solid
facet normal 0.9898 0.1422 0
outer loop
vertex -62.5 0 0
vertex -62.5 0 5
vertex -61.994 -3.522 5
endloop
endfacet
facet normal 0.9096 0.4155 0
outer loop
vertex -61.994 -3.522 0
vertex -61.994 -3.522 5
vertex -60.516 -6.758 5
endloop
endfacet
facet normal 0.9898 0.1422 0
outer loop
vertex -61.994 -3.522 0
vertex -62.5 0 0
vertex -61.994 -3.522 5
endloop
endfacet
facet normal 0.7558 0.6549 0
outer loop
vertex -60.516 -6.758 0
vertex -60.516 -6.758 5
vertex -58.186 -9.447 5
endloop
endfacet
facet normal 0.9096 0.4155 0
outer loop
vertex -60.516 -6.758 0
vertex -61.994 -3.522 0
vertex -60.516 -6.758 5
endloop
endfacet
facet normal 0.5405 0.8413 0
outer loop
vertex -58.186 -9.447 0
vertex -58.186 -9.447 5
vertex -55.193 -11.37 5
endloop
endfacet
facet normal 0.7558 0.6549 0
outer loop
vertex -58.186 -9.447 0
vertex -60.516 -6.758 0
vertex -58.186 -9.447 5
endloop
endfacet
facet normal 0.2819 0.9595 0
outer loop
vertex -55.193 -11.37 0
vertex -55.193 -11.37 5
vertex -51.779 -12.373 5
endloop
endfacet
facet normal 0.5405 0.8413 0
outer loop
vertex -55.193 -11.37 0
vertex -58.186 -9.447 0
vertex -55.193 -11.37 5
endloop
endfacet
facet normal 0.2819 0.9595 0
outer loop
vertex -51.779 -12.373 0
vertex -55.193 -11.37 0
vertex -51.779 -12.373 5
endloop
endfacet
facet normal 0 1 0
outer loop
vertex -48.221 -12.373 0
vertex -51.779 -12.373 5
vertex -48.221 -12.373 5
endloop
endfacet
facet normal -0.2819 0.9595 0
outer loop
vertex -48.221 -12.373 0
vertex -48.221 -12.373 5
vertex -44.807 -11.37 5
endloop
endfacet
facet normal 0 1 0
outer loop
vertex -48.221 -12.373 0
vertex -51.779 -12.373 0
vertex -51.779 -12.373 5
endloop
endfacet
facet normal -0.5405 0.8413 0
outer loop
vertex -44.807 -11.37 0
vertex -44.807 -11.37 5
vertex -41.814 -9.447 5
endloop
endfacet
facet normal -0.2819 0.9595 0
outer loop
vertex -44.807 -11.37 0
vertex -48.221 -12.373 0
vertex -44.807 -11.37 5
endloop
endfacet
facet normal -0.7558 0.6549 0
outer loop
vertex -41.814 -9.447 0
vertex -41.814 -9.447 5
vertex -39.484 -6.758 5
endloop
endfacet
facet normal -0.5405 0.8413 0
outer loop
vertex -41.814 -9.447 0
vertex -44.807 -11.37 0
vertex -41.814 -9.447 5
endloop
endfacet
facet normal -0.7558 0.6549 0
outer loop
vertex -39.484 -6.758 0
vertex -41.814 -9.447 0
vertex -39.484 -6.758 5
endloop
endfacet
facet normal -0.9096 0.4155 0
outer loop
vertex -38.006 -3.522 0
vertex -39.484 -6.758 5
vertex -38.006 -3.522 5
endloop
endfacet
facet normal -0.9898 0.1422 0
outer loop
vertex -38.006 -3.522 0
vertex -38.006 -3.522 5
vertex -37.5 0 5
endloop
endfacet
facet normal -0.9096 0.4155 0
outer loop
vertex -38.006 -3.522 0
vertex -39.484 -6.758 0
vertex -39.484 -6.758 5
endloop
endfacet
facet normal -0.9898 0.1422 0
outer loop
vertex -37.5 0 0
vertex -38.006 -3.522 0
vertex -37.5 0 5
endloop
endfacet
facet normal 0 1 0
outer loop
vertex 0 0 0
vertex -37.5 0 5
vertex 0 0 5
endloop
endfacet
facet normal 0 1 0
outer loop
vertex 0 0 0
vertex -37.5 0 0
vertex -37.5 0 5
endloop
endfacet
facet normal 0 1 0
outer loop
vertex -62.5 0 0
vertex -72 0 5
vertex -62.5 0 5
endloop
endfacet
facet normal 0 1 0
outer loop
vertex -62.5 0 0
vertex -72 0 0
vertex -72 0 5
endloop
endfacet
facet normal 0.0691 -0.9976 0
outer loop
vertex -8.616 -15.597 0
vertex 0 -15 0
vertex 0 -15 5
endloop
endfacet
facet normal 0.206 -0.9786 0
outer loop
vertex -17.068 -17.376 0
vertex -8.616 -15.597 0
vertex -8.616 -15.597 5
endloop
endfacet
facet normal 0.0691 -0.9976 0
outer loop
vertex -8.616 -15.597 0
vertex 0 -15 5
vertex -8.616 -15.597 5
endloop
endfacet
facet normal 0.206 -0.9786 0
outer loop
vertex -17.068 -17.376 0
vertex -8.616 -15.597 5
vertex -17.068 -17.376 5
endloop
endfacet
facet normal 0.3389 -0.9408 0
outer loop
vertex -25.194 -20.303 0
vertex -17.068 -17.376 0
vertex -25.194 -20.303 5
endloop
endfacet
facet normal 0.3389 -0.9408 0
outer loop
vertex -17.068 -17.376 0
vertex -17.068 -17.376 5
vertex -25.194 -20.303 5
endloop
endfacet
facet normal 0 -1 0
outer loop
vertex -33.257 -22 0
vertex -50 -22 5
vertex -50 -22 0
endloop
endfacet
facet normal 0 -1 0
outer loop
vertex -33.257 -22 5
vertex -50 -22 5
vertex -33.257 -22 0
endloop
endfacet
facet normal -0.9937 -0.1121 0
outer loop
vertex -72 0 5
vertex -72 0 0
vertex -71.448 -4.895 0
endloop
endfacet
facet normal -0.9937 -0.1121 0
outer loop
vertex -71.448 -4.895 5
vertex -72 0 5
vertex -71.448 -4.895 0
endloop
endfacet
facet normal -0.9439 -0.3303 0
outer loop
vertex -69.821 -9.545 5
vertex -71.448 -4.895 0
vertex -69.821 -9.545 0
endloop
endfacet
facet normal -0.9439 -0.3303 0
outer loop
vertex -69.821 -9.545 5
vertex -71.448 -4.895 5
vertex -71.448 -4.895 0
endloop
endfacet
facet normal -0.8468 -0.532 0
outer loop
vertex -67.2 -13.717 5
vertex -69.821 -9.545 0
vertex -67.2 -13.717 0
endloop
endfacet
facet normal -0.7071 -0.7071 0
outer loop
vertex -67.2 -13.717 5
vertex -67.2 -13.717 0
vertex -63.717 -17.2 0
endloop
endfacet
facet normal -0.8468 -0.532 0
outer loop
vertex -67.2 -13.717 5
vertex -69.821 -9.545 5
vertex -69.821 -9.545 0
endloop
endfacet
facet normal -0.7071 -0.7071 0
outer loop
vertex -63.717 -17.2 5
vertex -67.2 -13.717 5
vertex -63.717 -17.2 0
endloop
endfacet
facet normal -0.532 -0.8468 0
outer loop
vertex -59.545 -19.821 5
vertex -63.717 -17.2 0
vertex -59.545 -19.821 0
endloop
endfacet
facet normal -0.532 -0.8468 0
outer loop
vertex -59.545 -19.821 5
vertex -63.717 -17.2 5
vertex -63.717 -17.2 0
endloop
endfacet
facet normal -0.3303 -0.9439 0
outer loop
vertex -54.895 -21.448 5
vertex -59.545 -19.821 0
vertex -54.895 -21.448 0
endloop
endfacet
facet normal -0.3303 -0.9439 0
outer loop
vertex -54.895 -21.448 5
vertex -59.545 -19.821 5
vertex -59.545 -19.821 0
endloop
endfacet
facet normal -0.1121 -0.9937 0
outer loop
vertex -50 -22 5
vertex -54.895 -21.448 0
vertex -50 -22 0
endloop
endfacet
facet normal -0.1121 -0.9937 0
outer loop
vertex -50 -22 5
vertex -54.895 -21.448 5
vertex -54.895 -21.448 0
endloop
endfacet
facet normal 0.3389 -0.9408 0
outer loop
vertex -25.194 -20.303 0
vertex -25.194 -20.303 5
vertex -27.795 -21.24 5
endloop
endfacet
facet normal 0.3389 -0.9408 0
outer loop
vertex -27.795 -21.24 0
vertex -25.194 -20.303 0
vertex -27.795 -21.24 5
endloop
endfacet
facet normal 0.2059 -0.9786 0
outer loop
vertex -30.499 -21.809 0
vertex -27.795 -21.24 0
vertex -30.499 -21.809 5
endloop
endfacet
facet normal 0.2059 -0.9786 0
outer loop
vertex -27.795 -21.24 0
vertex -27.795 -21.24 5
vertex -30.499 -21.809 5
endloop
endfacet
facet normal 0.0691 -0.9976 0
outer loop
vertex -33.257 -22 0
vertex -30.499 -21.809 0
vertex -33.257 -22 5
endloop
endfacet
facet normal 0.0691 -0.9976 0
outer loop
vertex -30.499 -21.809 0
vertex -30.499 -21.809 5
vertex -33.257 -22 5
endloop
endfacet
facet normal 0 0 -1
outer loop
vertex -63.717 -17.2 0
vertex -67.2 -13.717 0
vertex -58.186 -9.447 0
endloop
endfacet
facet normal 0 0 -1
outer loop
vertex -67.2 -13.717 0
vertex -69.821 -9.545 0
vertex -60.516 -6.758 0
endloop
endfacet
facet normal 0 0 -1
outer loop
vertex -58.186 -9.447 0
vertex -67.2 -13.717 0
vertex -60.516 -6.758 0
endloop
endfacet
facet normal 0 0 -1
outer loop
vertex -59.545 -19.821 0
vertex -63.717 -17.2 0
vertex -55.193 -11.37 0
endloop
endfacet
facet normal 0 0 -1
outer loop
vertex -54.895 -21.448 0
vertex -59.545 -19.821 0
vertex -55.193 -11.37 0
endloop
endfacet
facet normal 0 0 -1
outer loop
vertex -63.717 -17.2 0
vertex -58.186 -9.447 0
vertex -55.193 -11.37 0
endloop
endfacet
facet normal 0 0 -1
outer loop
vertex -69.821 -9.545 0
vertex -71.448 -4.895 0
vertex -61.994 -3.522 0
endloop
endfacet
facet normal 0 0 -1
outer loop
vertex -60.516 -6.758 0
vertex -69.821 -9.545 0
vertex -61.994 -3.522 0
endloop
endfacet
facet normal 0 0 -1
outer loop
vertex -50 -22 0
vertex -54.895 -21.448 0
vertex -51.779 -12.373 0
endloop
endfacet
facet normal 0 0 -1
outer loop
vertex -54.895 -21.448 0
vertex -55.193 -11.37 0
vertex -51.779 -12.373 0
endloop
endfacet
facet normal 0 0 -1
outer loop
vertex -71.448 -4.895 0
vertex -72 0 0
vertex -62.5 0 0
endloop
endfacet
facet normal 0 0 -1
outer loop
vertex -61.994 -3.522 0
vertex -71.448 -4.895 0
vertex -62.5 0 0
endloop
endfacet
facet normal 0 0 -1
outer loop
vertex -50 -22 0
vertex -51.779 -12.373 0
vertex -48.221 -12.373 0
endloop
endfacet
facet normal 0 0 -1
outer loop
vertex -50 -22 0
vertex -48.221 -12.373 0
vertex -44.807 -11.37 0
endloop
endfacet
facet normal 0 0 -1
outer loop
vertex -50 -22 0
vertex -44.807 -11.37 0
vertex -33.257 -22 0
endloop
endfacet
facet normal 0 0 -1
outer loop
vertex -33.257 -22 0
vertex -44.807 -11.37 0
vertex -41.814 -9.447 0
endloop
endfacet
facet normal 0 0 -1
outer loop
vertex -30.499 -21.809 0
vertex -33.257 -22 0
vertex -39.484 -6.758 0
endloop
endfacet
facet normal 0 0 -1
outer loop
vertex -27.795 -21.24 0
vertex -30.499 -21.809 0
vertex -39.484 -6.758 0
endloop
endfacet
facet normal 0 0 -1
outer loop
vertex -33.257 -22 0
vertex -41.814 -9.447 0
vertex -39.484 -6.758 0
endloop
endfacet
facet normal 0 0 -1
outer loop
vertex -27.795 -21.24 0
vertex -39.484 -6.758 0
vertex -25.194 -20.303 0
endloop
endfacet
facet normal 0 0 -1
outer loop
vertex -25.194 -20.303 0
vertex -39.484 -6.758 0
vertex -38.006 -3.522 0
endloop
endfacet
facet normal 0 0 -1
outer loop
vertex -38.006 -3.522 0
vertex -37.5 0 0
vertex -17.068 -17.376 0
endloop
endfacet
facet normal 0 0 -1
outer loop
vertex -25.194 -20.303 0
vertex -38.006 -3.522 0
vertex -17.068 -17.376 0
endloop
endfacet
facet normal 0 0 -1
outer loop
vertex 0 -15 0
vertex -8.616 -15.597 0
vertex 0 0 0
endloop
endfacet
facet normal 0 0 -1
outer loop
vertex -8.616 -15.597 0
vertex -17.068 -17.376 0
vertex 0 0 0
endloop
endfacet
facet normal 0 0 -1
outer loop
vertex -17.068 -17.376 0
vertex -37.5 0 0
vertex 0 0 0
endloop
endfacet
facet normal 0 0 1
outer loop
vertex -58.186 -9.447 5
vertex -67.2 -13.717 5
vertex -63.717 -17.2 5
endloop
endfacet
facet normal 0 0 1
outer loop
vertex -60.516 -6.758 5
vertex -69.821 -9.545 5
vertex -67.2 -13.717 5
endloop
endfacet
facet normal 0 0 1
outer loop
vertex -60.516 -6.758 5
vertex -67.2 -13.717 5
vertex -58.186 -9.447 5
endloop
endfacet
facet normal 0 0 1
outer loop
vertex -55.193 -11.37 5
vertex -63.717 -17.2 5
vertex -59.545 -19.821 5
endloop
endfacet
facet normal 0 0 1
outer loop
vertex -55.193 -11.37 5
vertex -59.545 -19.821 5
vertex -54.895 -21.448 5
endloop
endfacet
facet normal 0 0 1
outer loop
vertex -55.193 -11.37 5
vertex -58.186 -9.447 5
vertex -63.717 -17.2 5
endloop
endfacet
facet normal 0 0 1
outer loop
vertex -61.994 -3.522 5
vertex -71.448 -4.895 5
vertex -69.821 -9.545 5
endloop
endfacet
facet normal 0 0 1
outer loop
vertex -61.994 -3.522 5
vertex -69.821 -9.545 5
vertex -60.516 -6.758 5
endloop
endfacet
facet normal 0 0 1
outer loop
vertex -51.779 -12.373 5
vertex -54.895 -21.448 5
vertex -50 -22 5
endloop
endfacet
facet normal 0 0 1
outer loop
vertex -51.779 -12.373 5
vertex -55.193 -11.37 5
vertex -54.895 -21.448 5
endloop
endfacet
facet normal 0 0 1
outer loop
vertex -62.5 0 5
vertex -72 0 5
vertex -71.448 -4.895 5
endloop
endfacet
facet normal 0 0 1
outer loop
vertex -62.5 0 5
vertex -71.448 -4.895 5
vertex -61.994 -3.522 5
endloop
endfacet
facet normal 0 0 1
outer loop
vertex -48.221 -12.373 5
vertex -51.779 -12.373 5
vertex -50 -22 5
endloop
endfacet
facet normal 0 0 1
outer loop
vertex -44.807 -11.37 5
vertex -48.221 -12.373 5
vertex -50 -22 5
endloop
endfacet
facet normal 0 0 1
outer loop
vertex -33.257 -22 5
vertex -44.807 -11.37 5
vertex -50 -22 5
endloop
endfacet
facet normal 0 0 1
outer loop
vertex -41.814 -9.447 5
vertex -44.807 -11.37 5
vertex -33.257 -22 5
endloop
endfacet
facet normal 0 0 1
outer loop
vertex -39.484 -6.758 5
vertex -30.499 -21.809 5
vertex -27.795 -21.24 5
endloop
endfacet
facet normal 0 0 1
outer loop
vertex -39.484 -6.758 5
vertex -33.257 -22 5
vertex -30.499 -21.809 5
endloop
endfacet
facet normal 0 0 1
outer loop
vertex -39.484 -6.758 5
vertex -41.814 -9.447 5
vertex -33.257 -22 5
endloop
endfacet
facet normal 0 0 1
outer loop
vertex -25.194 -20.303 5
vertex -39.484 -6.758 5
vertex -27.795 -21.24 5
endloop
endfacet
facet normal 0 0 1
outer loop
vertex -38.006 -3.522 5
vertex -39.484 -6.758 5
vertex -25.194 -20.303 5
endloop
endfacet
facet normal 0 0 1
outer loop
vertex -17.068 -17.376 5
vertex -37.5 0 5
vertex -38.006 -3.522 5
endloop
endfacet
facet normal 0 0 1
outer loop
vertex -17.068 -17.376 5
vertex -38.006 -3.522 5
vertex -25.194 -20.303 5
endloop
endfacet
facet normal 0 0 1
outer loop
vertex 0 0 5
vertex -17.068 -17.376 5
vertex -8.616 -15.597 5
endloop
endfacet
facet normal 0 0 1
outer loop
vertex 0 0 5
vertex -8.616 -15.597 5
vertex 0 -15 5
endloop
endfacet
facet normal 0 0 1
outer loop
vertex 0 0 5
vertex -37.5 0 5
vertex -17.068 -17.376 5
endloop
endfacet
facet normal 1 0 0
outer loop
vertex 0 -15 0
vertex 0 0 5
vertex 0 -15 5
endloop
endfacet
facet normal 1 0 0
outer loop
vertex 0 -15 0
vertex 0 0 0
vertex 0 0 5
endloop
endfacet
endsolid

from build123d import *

# Parameters (mm, degrees)
SKETCH_R             = 12.5
PAD_DEPTH            = 5
SKETCH001_R          = 62.5
POCKET_DEPTH         = 5.001
POCKET_DEPTH_BACK    = -5.001
FILLET_R             = 20
POCKET001_DEPTH      = 5.001
POCKET001_DEPTH_BACK = -5.001
SKETCH003_W          = 72
SKETCH003_H          = 22
POCKET002_DEPTH      = 5.001


with BuildPart() as part:
    # Sketch → Pad (new body, symmetric)
    with BuildSketch(Plane.XY):
        with BuildLine():
            ThreePointArc((-50, 22), (-72, 0), (-50, -22))
            Line((-50, -22), (50, -22))
            ThreePointArc((50, -22), (72, 0), (50, 22))
            Line((50, 22), (-50, 22))
        make_face()
        with Locations((-50, 0)):
            Circle(SKETCH_R, mode=Mode.SUBTRACT)
        with Locations((50, 0)):
            Circle(SKETCH_R, mode=Mode.SUBTRACT)
    extrude(amount=PAD_DEPTH, both=True)

    # Sketch001 → Pocket (cut, two sides)
    with BuildSketch(Plane.XY) as pocket_sk:
        with Locations((0, -77.5)):
            Circle(SKETCH001_R)
        with Locations((0, 77.5)):
            Circle(SKETCH001_R)
    extrude(amount=-POCKET_DEPTH, mode=Mode.SUBTRACT)
    extrude(pocket_sk.sketch, amount=-POCKET_DEPTH_BACK, mode=Mode.SUBTRACT)

    # Fillet
    fillet_edges = [part.edges().sort_by_distance(p)[0] for p in [
        (-28.740216, -22, 0),
        (28.740216, -22, 0),
        (-28.740216, 22, 0),
        (28.740216, 22, 0),
    ]]
    fillet(fillet_edges, radius=FILLET_R)

    # Sketch002 → Pocket001 (cut, two sides)
    with BuildSketch(Plane.XY) as pocket001_sk:
        Polygon((72, -22), (72, 22), (-72, 22), (-72, 0), (0, 0), (0, -22), align=None)
    extrude(amount=-POCKET001_DEPTH, mode=Mode.SUBTRACT)
    extrude(pocket001_sk.sketch, amount=-POCKET001_DEPTH_BACK, mode=Mode.SUBTRACT)

    # Sketch003 → Pocket002 (cut, through all)
    with BuildSketch(Plane.XY):
        with Locations((-36, -11)):
            Rectangle(SKETCH003_W, SKETCH003_H)
    extrude(amount=-POCKET002_DEPTH, mode=Mode.SUBTRACT)


solid = part.part
